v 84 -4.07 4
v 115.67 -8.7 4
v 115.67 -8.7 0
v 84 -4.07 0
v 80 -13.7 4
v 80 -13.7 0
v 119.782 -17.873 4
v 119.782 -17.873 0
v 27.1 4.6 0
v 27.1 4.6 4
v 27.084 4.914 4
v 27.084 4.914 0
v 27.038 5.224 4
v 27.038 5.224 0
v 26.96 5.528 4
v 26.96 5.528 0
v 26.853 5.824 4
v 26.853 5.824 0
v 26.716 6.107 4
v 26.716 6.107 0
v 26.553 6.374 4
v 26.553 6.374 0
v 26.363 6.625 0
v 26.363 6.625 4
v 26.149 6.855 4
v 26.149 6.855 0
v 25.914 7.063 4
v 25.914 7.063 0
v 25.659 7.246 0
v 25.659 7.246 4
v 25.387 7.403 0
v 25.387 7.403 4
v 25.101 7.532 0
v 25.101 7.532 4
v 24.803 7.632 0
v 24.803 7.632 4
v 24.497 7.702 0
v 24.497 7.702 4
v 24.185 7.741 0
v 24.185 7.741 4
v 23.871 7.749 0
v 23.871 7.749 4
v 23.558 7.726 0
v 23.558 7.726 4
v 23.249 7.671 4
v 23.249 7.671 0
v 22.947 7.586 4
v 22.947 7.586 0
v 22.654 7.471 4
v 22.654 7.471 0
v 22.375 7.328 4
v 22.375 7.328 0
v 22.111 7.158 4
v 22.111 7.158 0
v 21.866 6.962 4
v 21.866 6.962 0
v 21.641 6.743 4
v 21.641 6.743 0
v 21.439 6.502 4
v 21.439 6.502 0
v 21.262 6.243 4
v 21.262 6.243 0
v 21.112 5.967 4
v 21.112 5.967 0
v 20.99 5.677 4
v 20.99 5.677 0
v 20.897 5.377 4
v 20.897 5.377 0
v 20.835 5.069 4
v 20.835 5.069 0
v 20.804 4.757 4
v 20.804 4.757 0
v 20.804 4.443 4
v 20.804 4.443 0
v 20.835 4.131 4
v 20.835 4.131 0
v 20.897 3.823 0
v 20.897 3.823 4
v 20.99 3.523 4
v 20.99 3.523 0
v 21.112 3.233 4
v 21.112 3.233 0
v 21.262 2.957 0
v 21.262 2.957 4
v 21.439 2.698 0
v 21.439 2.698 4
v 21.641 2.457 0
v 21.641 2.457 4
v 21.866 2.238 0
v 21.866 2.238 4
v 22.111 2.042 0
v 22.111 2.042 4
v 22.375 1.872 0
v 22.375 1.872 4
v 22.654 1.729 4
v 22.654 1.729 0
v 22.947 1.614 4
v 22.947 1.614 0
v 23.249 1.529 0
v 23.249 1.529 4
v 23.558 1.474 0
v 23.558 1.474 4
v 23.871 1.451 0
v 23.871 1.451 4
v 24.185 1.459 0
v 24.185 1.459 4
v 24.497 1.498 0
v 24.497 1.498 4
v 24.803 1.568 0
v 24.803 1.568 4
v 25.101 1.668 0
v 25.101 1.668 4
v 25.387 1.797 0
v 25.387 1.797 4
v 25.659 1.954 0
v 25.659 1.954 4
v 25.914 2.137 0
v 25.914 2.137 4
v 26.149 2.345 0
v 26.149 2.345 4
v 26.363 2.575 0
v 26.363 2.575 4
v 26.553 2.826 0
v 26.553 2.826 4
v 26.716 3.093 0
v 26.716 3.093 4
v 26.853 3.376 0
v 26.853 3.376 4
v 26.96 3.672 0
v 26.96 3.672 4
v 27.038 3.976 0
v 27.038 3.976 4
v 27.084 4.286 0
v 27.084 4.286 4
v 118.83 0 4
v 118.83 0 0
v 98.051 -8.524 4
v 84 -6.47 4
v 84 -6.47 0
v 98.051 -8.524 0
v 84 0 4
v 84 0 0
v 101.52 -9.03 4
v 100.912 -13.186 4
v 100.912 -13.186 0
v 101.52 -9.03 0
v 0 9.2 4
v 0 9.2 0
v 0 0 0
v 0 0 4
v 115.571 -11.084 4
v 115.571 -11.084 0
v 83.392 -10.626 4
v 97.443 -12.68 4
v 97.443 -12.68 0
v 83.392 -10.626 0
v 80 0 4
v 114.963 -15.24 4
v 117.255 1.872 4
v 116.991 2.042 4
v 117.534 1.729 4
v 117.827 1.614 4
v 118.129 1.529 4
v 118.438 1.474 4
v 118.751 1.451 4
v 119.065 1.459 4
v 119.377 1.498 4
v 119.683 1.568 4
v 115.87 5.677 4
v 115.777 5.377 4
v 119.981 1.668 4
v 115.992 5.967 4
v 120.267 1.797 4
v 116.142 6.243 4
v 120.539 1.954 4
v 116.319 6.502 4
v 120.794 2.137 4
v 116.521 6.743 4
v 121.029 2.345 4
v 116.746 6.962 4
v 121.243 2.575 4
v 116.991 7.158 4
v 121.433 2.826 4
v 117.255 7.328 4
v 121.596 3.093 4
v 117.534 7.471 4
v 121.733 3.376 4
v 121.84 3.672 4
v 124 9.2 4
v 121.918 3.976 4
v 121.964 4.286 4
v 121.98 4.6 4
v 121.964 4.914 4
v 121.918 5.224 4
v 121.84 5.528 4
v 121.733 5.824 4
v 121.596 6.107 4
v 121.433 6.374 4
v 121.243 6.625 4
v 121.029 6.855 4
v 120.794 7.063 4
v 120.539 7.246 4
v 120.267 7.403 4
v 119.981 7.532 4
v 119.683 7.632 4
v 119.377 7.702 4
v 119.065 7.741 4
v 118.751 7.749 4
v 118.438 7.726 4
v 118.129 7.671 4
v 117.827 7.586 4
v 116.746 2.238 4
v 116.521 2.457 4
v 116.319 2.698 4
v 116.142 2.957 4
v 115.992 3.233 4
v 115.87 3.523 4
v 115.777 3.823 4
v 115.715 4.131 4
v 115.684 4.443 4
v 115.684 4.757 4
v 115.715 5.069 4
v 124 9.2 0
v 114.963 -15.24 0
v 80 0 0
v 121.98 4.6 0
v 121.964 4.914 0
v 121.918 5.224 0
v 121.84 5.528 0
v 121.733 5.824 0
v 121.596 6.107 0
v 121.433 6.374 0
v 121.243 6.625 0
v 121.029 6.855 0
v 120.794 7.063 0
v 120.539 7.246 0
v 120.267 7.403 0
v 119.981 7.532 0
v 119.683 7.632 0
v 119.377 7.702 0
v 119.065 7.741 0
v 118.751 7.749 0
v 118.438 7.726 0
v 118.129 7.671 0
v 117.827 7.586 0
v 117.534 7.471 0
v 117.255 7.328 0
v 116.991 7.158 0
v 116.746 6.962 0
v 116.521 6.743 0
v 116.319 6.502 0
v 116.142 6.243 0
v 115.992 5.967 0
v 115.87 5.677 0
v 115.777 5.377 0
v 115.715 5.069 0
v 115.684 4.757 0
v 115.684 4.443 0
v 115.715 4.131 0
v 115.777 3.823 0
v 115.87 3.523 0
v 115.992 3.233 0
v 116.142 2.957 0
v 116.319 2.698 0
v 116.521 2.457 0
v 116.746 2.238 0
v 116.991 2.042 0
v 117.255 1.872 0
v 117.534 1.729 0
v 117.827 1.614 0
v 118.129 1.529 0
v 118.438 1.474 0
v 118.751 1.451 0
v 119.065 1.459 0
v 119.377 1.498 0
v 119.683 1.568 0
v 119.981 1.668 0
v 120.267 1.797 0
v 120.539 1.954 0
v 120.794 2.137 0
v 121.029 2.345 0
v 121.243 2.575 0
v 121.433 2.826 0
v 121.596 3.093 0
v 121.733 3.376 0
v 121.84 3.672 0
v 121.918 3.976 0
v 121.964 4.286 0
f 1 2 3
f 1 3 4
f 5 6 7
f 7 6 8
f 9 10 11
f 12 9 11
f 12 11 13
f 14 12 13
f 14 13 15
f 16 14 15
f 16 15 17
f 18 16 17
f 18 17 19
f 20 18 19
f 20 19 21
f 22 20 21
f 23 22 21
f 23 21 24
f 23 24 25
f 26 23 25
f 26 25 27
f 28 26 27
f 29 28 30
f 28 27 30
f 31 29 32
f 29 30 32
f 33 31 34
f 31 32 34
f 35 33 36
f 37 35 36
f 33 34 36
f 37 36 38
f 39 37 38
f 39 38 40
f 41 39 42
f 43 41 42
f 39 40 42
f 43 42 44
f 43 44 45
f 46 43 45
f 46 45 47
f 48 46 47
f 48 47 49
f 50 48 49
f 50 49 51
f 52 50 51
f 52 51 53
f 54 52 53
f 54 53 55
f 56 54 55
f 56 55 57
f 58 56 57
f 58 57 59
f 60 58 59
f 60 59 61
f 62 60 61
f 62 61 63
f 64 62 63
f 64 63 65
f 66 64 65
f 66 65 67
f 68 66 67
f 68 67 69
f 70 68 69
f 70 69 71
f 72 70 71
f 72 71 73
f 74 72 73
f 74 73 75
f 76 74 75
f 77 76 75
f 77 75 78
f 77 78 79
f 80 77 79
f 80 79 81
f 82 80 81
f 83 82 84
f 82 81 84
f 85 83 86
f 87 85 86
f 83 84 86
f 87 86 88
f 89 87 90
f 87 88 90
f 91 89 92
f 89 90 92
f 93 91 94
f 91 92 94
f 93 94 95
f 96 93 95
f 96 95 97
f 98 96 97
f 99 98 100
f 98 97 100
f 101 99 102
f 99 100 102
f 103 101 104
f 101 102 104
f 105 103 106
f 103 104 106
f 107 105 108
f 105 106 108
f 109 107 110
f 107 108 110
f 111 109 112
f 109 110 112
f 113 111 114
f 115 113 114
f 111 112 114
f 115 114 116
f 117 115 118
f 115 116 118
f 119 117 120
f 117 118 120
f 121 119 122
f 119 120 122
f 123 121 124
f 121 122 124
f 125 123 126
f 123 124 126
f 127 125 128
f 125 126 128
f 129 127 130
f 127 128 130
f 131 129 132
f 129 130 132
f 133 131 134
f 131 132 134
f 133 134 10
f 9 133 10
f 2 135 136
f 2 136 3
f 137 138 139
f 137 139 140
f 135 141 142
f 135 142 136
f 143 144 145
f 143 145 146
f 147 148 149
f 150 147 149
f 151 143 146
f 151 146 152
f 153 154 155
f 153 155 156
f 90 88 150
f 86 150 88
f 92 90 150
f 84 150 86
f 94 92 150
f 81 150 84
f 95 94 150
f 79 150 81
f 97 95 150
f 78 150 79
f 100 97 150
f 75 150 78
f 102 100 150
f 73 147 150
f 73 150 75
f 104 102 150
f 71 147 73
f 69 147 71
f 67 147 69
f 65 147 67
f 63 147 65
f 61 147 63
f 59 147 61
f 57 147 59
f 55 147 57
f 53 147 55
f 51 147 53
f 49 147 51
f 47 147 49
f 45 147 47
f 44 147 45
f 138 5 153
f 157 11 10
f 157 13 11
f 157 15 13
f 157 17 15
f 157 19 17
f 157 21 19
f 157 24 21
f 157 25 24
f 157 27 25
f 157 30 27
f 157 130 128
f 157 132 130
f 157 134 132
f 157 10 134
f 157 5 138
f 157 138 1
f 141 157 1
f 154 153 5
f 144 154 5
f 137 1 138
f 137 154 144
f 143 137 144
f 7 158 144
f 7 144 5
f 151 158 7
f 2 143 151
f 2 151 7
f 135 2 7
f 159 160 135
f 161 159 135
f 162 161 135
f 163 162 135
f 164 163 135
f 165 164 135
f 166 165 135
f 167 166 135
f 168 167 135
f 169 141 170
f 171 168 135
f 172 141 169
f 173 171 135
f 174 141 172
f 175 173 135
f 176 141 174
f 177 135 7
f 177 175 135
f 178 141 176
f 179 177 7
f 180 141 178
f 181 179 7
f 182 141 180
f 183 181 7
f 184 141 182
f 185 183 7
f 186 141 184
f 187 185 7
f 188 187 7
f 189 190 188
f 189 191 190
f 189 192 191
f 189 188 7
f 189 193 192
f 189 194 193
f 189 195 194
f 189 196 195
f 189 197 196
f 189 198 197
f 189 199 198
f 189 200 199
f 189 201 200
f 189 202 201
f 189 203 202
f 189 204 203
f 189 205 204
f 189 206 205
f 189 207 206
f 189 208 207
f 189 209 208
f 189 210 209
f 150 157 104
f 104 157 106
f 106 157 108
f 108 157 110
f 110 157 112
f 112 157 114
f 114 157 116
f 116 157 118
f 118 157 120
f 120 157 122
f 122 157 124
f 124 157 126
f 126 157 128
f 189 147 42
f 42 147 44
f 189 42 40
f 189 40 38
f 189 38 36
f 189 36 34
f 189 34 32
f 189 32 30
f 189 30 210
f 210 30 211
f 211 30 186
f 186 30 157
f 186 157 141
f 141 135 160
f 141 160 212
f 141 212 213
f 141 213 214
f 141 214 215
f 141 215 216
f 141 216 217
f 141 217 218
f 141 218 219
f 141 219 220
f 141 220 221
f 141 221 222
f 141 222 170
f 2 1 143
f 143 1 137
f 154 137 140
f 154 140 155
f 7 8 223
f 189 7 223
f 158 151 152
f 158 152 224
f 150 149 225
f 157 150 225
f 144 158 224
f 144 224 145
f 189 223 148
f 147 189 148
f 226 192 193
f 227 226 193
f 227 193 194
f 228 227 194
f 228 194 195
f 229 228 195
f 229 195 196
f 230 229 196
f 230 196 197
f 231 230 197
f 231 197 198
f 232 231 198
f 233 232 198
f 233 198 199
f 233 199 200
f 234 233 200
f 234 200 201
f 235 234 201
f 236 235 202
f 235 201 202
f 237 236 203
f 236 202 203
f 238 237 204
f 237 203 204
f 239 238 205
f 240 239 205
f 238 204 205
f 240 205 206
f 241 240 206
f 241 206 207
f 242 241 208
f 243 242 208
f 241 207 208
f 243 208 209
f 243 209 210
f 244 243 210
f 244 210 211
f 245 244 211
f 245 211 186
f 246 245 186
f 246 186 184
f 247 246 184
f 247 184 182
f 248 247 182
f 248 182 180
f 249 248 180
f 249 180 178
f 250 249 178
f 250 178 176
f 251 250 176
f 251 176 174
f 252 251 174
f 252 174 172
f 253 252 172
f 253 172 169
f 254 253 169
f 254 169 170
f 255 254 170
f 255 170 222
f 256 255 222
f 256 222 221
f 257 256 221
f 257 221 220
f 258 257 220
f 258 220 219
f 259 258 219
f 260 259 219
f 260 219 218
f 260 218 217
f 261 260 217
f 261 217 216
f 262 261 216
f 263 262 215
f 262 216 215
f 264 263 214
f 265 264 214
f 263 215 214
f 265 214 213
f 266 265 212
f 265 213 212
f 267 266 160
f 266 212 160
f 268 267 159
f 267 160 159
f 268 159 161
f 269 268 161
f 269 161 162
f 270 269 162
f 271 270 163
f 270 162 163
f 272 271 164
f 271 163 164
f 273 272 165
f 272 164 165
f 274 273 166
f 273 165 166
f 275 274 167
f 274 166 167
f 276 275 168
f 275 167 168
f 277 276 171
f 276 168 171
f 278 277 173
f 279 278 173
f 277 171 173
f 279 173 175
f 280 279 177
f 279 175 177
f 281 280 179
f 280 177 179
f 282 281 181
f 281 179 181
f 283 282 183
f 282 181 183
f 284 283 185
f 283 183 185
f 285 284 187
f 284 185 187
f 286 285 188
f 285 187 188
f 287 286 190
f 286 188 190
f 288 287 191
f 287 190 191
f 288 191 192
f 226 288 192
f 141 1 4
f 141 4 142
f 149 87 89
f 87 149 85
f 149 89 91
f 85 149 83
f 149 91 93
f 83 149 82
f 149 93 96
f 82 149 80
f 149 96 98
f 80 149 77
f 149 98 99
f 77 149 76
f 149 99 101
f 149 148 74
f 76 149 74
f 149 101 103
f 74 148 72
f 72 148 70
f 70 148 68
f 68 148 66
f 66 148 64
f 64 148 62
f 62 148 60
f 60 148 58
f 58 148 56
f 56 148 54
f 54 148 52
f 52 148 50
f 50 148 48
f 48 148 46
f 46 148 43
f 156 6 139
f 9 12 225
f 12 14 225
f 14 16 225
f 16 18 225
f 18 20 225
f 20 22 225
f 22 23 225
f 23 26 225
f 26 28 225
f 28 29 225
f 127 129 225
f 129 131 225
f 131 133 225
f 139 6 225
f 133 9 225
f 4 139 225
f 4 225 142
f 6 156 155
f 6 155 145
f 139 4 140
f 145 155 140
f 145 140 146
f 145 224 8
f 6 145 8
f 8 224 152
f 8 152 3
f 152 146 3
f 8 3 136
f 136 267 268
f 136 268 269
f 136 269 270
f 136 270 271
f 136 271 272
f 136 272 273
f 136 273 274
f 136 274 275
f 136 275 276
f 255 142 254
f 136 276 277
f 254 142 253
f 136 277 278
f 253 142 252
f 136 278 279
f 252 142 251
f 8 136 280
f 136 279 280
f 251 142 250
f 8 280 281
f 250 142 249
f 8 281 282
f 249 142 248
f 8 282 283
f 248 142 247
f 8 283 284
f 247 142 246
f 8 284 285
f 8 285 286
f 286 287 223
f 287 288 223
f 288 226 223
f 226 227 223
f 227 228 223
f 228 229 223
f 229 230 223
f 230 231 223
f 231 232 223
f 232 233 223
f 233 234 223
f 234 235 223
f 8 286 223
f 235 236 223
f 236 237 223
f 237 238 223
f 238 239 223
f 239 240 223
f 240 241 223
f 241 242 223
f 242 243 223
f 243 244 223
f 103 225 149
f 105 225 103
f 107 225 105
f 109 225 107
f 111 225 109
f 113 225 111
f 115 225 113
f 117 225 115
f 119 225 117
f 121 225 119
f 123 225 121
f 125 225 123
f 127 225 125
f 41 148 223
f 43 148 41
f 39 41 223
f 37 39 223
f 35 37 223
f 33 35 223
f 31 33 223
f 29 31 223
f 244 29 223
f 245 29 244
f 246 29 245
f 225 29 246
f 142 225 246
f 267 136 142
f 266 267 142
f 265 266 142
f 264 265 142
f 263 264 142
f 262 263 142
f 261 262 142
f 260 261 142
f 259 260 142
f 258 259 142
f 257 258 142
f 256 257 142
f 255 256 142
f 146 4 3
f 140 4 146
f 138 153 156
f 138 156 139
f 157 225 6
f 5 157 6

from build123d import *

# Parameters (mm, degrees)
PAD_DEPTH    = 4
SKETCH001_R  = 3.15
POCKET_DEPTH = 5


with BuildPart() as part:
    # Sketch → Pad (new body)
    with BuildSketch(Plane.XY):
        Polygon((0, 9.2), (0, 0), (80, 0), (80, -13.7), (119.781694, -17.873343), (124, 9.2), align=None)
    extrude(amount=PAD_DEPTH)

    # Sketch001 (on DatumPlane) → Pocket (cut)
    with BuildSketch(Plane.XY.offset(4)):
        with Locations((23.95, 4.6)):
            Circle(SKETCH001_R)
        with Locations((118.83, 4.6)):
            Circle(SKETCH001_R)
        Polygon((84, 0), (118.83, 0), (115.67, -8.7), (84, -4.07), align=None)
        Polygon((84, -6.47), (98.050642, -8.524135), (97.44308, -12.679959), (83.392439, -10.625824), align=None)
        Polygon((101.52, -9.03), (115.570642, -11.084135), (114.96308, -15.239959), (100.912439, -13.185824), align=None)
    extrude(amount=-POCKET_DEPTH, mode=Mode.SUBTRACT)


solid = part.part
